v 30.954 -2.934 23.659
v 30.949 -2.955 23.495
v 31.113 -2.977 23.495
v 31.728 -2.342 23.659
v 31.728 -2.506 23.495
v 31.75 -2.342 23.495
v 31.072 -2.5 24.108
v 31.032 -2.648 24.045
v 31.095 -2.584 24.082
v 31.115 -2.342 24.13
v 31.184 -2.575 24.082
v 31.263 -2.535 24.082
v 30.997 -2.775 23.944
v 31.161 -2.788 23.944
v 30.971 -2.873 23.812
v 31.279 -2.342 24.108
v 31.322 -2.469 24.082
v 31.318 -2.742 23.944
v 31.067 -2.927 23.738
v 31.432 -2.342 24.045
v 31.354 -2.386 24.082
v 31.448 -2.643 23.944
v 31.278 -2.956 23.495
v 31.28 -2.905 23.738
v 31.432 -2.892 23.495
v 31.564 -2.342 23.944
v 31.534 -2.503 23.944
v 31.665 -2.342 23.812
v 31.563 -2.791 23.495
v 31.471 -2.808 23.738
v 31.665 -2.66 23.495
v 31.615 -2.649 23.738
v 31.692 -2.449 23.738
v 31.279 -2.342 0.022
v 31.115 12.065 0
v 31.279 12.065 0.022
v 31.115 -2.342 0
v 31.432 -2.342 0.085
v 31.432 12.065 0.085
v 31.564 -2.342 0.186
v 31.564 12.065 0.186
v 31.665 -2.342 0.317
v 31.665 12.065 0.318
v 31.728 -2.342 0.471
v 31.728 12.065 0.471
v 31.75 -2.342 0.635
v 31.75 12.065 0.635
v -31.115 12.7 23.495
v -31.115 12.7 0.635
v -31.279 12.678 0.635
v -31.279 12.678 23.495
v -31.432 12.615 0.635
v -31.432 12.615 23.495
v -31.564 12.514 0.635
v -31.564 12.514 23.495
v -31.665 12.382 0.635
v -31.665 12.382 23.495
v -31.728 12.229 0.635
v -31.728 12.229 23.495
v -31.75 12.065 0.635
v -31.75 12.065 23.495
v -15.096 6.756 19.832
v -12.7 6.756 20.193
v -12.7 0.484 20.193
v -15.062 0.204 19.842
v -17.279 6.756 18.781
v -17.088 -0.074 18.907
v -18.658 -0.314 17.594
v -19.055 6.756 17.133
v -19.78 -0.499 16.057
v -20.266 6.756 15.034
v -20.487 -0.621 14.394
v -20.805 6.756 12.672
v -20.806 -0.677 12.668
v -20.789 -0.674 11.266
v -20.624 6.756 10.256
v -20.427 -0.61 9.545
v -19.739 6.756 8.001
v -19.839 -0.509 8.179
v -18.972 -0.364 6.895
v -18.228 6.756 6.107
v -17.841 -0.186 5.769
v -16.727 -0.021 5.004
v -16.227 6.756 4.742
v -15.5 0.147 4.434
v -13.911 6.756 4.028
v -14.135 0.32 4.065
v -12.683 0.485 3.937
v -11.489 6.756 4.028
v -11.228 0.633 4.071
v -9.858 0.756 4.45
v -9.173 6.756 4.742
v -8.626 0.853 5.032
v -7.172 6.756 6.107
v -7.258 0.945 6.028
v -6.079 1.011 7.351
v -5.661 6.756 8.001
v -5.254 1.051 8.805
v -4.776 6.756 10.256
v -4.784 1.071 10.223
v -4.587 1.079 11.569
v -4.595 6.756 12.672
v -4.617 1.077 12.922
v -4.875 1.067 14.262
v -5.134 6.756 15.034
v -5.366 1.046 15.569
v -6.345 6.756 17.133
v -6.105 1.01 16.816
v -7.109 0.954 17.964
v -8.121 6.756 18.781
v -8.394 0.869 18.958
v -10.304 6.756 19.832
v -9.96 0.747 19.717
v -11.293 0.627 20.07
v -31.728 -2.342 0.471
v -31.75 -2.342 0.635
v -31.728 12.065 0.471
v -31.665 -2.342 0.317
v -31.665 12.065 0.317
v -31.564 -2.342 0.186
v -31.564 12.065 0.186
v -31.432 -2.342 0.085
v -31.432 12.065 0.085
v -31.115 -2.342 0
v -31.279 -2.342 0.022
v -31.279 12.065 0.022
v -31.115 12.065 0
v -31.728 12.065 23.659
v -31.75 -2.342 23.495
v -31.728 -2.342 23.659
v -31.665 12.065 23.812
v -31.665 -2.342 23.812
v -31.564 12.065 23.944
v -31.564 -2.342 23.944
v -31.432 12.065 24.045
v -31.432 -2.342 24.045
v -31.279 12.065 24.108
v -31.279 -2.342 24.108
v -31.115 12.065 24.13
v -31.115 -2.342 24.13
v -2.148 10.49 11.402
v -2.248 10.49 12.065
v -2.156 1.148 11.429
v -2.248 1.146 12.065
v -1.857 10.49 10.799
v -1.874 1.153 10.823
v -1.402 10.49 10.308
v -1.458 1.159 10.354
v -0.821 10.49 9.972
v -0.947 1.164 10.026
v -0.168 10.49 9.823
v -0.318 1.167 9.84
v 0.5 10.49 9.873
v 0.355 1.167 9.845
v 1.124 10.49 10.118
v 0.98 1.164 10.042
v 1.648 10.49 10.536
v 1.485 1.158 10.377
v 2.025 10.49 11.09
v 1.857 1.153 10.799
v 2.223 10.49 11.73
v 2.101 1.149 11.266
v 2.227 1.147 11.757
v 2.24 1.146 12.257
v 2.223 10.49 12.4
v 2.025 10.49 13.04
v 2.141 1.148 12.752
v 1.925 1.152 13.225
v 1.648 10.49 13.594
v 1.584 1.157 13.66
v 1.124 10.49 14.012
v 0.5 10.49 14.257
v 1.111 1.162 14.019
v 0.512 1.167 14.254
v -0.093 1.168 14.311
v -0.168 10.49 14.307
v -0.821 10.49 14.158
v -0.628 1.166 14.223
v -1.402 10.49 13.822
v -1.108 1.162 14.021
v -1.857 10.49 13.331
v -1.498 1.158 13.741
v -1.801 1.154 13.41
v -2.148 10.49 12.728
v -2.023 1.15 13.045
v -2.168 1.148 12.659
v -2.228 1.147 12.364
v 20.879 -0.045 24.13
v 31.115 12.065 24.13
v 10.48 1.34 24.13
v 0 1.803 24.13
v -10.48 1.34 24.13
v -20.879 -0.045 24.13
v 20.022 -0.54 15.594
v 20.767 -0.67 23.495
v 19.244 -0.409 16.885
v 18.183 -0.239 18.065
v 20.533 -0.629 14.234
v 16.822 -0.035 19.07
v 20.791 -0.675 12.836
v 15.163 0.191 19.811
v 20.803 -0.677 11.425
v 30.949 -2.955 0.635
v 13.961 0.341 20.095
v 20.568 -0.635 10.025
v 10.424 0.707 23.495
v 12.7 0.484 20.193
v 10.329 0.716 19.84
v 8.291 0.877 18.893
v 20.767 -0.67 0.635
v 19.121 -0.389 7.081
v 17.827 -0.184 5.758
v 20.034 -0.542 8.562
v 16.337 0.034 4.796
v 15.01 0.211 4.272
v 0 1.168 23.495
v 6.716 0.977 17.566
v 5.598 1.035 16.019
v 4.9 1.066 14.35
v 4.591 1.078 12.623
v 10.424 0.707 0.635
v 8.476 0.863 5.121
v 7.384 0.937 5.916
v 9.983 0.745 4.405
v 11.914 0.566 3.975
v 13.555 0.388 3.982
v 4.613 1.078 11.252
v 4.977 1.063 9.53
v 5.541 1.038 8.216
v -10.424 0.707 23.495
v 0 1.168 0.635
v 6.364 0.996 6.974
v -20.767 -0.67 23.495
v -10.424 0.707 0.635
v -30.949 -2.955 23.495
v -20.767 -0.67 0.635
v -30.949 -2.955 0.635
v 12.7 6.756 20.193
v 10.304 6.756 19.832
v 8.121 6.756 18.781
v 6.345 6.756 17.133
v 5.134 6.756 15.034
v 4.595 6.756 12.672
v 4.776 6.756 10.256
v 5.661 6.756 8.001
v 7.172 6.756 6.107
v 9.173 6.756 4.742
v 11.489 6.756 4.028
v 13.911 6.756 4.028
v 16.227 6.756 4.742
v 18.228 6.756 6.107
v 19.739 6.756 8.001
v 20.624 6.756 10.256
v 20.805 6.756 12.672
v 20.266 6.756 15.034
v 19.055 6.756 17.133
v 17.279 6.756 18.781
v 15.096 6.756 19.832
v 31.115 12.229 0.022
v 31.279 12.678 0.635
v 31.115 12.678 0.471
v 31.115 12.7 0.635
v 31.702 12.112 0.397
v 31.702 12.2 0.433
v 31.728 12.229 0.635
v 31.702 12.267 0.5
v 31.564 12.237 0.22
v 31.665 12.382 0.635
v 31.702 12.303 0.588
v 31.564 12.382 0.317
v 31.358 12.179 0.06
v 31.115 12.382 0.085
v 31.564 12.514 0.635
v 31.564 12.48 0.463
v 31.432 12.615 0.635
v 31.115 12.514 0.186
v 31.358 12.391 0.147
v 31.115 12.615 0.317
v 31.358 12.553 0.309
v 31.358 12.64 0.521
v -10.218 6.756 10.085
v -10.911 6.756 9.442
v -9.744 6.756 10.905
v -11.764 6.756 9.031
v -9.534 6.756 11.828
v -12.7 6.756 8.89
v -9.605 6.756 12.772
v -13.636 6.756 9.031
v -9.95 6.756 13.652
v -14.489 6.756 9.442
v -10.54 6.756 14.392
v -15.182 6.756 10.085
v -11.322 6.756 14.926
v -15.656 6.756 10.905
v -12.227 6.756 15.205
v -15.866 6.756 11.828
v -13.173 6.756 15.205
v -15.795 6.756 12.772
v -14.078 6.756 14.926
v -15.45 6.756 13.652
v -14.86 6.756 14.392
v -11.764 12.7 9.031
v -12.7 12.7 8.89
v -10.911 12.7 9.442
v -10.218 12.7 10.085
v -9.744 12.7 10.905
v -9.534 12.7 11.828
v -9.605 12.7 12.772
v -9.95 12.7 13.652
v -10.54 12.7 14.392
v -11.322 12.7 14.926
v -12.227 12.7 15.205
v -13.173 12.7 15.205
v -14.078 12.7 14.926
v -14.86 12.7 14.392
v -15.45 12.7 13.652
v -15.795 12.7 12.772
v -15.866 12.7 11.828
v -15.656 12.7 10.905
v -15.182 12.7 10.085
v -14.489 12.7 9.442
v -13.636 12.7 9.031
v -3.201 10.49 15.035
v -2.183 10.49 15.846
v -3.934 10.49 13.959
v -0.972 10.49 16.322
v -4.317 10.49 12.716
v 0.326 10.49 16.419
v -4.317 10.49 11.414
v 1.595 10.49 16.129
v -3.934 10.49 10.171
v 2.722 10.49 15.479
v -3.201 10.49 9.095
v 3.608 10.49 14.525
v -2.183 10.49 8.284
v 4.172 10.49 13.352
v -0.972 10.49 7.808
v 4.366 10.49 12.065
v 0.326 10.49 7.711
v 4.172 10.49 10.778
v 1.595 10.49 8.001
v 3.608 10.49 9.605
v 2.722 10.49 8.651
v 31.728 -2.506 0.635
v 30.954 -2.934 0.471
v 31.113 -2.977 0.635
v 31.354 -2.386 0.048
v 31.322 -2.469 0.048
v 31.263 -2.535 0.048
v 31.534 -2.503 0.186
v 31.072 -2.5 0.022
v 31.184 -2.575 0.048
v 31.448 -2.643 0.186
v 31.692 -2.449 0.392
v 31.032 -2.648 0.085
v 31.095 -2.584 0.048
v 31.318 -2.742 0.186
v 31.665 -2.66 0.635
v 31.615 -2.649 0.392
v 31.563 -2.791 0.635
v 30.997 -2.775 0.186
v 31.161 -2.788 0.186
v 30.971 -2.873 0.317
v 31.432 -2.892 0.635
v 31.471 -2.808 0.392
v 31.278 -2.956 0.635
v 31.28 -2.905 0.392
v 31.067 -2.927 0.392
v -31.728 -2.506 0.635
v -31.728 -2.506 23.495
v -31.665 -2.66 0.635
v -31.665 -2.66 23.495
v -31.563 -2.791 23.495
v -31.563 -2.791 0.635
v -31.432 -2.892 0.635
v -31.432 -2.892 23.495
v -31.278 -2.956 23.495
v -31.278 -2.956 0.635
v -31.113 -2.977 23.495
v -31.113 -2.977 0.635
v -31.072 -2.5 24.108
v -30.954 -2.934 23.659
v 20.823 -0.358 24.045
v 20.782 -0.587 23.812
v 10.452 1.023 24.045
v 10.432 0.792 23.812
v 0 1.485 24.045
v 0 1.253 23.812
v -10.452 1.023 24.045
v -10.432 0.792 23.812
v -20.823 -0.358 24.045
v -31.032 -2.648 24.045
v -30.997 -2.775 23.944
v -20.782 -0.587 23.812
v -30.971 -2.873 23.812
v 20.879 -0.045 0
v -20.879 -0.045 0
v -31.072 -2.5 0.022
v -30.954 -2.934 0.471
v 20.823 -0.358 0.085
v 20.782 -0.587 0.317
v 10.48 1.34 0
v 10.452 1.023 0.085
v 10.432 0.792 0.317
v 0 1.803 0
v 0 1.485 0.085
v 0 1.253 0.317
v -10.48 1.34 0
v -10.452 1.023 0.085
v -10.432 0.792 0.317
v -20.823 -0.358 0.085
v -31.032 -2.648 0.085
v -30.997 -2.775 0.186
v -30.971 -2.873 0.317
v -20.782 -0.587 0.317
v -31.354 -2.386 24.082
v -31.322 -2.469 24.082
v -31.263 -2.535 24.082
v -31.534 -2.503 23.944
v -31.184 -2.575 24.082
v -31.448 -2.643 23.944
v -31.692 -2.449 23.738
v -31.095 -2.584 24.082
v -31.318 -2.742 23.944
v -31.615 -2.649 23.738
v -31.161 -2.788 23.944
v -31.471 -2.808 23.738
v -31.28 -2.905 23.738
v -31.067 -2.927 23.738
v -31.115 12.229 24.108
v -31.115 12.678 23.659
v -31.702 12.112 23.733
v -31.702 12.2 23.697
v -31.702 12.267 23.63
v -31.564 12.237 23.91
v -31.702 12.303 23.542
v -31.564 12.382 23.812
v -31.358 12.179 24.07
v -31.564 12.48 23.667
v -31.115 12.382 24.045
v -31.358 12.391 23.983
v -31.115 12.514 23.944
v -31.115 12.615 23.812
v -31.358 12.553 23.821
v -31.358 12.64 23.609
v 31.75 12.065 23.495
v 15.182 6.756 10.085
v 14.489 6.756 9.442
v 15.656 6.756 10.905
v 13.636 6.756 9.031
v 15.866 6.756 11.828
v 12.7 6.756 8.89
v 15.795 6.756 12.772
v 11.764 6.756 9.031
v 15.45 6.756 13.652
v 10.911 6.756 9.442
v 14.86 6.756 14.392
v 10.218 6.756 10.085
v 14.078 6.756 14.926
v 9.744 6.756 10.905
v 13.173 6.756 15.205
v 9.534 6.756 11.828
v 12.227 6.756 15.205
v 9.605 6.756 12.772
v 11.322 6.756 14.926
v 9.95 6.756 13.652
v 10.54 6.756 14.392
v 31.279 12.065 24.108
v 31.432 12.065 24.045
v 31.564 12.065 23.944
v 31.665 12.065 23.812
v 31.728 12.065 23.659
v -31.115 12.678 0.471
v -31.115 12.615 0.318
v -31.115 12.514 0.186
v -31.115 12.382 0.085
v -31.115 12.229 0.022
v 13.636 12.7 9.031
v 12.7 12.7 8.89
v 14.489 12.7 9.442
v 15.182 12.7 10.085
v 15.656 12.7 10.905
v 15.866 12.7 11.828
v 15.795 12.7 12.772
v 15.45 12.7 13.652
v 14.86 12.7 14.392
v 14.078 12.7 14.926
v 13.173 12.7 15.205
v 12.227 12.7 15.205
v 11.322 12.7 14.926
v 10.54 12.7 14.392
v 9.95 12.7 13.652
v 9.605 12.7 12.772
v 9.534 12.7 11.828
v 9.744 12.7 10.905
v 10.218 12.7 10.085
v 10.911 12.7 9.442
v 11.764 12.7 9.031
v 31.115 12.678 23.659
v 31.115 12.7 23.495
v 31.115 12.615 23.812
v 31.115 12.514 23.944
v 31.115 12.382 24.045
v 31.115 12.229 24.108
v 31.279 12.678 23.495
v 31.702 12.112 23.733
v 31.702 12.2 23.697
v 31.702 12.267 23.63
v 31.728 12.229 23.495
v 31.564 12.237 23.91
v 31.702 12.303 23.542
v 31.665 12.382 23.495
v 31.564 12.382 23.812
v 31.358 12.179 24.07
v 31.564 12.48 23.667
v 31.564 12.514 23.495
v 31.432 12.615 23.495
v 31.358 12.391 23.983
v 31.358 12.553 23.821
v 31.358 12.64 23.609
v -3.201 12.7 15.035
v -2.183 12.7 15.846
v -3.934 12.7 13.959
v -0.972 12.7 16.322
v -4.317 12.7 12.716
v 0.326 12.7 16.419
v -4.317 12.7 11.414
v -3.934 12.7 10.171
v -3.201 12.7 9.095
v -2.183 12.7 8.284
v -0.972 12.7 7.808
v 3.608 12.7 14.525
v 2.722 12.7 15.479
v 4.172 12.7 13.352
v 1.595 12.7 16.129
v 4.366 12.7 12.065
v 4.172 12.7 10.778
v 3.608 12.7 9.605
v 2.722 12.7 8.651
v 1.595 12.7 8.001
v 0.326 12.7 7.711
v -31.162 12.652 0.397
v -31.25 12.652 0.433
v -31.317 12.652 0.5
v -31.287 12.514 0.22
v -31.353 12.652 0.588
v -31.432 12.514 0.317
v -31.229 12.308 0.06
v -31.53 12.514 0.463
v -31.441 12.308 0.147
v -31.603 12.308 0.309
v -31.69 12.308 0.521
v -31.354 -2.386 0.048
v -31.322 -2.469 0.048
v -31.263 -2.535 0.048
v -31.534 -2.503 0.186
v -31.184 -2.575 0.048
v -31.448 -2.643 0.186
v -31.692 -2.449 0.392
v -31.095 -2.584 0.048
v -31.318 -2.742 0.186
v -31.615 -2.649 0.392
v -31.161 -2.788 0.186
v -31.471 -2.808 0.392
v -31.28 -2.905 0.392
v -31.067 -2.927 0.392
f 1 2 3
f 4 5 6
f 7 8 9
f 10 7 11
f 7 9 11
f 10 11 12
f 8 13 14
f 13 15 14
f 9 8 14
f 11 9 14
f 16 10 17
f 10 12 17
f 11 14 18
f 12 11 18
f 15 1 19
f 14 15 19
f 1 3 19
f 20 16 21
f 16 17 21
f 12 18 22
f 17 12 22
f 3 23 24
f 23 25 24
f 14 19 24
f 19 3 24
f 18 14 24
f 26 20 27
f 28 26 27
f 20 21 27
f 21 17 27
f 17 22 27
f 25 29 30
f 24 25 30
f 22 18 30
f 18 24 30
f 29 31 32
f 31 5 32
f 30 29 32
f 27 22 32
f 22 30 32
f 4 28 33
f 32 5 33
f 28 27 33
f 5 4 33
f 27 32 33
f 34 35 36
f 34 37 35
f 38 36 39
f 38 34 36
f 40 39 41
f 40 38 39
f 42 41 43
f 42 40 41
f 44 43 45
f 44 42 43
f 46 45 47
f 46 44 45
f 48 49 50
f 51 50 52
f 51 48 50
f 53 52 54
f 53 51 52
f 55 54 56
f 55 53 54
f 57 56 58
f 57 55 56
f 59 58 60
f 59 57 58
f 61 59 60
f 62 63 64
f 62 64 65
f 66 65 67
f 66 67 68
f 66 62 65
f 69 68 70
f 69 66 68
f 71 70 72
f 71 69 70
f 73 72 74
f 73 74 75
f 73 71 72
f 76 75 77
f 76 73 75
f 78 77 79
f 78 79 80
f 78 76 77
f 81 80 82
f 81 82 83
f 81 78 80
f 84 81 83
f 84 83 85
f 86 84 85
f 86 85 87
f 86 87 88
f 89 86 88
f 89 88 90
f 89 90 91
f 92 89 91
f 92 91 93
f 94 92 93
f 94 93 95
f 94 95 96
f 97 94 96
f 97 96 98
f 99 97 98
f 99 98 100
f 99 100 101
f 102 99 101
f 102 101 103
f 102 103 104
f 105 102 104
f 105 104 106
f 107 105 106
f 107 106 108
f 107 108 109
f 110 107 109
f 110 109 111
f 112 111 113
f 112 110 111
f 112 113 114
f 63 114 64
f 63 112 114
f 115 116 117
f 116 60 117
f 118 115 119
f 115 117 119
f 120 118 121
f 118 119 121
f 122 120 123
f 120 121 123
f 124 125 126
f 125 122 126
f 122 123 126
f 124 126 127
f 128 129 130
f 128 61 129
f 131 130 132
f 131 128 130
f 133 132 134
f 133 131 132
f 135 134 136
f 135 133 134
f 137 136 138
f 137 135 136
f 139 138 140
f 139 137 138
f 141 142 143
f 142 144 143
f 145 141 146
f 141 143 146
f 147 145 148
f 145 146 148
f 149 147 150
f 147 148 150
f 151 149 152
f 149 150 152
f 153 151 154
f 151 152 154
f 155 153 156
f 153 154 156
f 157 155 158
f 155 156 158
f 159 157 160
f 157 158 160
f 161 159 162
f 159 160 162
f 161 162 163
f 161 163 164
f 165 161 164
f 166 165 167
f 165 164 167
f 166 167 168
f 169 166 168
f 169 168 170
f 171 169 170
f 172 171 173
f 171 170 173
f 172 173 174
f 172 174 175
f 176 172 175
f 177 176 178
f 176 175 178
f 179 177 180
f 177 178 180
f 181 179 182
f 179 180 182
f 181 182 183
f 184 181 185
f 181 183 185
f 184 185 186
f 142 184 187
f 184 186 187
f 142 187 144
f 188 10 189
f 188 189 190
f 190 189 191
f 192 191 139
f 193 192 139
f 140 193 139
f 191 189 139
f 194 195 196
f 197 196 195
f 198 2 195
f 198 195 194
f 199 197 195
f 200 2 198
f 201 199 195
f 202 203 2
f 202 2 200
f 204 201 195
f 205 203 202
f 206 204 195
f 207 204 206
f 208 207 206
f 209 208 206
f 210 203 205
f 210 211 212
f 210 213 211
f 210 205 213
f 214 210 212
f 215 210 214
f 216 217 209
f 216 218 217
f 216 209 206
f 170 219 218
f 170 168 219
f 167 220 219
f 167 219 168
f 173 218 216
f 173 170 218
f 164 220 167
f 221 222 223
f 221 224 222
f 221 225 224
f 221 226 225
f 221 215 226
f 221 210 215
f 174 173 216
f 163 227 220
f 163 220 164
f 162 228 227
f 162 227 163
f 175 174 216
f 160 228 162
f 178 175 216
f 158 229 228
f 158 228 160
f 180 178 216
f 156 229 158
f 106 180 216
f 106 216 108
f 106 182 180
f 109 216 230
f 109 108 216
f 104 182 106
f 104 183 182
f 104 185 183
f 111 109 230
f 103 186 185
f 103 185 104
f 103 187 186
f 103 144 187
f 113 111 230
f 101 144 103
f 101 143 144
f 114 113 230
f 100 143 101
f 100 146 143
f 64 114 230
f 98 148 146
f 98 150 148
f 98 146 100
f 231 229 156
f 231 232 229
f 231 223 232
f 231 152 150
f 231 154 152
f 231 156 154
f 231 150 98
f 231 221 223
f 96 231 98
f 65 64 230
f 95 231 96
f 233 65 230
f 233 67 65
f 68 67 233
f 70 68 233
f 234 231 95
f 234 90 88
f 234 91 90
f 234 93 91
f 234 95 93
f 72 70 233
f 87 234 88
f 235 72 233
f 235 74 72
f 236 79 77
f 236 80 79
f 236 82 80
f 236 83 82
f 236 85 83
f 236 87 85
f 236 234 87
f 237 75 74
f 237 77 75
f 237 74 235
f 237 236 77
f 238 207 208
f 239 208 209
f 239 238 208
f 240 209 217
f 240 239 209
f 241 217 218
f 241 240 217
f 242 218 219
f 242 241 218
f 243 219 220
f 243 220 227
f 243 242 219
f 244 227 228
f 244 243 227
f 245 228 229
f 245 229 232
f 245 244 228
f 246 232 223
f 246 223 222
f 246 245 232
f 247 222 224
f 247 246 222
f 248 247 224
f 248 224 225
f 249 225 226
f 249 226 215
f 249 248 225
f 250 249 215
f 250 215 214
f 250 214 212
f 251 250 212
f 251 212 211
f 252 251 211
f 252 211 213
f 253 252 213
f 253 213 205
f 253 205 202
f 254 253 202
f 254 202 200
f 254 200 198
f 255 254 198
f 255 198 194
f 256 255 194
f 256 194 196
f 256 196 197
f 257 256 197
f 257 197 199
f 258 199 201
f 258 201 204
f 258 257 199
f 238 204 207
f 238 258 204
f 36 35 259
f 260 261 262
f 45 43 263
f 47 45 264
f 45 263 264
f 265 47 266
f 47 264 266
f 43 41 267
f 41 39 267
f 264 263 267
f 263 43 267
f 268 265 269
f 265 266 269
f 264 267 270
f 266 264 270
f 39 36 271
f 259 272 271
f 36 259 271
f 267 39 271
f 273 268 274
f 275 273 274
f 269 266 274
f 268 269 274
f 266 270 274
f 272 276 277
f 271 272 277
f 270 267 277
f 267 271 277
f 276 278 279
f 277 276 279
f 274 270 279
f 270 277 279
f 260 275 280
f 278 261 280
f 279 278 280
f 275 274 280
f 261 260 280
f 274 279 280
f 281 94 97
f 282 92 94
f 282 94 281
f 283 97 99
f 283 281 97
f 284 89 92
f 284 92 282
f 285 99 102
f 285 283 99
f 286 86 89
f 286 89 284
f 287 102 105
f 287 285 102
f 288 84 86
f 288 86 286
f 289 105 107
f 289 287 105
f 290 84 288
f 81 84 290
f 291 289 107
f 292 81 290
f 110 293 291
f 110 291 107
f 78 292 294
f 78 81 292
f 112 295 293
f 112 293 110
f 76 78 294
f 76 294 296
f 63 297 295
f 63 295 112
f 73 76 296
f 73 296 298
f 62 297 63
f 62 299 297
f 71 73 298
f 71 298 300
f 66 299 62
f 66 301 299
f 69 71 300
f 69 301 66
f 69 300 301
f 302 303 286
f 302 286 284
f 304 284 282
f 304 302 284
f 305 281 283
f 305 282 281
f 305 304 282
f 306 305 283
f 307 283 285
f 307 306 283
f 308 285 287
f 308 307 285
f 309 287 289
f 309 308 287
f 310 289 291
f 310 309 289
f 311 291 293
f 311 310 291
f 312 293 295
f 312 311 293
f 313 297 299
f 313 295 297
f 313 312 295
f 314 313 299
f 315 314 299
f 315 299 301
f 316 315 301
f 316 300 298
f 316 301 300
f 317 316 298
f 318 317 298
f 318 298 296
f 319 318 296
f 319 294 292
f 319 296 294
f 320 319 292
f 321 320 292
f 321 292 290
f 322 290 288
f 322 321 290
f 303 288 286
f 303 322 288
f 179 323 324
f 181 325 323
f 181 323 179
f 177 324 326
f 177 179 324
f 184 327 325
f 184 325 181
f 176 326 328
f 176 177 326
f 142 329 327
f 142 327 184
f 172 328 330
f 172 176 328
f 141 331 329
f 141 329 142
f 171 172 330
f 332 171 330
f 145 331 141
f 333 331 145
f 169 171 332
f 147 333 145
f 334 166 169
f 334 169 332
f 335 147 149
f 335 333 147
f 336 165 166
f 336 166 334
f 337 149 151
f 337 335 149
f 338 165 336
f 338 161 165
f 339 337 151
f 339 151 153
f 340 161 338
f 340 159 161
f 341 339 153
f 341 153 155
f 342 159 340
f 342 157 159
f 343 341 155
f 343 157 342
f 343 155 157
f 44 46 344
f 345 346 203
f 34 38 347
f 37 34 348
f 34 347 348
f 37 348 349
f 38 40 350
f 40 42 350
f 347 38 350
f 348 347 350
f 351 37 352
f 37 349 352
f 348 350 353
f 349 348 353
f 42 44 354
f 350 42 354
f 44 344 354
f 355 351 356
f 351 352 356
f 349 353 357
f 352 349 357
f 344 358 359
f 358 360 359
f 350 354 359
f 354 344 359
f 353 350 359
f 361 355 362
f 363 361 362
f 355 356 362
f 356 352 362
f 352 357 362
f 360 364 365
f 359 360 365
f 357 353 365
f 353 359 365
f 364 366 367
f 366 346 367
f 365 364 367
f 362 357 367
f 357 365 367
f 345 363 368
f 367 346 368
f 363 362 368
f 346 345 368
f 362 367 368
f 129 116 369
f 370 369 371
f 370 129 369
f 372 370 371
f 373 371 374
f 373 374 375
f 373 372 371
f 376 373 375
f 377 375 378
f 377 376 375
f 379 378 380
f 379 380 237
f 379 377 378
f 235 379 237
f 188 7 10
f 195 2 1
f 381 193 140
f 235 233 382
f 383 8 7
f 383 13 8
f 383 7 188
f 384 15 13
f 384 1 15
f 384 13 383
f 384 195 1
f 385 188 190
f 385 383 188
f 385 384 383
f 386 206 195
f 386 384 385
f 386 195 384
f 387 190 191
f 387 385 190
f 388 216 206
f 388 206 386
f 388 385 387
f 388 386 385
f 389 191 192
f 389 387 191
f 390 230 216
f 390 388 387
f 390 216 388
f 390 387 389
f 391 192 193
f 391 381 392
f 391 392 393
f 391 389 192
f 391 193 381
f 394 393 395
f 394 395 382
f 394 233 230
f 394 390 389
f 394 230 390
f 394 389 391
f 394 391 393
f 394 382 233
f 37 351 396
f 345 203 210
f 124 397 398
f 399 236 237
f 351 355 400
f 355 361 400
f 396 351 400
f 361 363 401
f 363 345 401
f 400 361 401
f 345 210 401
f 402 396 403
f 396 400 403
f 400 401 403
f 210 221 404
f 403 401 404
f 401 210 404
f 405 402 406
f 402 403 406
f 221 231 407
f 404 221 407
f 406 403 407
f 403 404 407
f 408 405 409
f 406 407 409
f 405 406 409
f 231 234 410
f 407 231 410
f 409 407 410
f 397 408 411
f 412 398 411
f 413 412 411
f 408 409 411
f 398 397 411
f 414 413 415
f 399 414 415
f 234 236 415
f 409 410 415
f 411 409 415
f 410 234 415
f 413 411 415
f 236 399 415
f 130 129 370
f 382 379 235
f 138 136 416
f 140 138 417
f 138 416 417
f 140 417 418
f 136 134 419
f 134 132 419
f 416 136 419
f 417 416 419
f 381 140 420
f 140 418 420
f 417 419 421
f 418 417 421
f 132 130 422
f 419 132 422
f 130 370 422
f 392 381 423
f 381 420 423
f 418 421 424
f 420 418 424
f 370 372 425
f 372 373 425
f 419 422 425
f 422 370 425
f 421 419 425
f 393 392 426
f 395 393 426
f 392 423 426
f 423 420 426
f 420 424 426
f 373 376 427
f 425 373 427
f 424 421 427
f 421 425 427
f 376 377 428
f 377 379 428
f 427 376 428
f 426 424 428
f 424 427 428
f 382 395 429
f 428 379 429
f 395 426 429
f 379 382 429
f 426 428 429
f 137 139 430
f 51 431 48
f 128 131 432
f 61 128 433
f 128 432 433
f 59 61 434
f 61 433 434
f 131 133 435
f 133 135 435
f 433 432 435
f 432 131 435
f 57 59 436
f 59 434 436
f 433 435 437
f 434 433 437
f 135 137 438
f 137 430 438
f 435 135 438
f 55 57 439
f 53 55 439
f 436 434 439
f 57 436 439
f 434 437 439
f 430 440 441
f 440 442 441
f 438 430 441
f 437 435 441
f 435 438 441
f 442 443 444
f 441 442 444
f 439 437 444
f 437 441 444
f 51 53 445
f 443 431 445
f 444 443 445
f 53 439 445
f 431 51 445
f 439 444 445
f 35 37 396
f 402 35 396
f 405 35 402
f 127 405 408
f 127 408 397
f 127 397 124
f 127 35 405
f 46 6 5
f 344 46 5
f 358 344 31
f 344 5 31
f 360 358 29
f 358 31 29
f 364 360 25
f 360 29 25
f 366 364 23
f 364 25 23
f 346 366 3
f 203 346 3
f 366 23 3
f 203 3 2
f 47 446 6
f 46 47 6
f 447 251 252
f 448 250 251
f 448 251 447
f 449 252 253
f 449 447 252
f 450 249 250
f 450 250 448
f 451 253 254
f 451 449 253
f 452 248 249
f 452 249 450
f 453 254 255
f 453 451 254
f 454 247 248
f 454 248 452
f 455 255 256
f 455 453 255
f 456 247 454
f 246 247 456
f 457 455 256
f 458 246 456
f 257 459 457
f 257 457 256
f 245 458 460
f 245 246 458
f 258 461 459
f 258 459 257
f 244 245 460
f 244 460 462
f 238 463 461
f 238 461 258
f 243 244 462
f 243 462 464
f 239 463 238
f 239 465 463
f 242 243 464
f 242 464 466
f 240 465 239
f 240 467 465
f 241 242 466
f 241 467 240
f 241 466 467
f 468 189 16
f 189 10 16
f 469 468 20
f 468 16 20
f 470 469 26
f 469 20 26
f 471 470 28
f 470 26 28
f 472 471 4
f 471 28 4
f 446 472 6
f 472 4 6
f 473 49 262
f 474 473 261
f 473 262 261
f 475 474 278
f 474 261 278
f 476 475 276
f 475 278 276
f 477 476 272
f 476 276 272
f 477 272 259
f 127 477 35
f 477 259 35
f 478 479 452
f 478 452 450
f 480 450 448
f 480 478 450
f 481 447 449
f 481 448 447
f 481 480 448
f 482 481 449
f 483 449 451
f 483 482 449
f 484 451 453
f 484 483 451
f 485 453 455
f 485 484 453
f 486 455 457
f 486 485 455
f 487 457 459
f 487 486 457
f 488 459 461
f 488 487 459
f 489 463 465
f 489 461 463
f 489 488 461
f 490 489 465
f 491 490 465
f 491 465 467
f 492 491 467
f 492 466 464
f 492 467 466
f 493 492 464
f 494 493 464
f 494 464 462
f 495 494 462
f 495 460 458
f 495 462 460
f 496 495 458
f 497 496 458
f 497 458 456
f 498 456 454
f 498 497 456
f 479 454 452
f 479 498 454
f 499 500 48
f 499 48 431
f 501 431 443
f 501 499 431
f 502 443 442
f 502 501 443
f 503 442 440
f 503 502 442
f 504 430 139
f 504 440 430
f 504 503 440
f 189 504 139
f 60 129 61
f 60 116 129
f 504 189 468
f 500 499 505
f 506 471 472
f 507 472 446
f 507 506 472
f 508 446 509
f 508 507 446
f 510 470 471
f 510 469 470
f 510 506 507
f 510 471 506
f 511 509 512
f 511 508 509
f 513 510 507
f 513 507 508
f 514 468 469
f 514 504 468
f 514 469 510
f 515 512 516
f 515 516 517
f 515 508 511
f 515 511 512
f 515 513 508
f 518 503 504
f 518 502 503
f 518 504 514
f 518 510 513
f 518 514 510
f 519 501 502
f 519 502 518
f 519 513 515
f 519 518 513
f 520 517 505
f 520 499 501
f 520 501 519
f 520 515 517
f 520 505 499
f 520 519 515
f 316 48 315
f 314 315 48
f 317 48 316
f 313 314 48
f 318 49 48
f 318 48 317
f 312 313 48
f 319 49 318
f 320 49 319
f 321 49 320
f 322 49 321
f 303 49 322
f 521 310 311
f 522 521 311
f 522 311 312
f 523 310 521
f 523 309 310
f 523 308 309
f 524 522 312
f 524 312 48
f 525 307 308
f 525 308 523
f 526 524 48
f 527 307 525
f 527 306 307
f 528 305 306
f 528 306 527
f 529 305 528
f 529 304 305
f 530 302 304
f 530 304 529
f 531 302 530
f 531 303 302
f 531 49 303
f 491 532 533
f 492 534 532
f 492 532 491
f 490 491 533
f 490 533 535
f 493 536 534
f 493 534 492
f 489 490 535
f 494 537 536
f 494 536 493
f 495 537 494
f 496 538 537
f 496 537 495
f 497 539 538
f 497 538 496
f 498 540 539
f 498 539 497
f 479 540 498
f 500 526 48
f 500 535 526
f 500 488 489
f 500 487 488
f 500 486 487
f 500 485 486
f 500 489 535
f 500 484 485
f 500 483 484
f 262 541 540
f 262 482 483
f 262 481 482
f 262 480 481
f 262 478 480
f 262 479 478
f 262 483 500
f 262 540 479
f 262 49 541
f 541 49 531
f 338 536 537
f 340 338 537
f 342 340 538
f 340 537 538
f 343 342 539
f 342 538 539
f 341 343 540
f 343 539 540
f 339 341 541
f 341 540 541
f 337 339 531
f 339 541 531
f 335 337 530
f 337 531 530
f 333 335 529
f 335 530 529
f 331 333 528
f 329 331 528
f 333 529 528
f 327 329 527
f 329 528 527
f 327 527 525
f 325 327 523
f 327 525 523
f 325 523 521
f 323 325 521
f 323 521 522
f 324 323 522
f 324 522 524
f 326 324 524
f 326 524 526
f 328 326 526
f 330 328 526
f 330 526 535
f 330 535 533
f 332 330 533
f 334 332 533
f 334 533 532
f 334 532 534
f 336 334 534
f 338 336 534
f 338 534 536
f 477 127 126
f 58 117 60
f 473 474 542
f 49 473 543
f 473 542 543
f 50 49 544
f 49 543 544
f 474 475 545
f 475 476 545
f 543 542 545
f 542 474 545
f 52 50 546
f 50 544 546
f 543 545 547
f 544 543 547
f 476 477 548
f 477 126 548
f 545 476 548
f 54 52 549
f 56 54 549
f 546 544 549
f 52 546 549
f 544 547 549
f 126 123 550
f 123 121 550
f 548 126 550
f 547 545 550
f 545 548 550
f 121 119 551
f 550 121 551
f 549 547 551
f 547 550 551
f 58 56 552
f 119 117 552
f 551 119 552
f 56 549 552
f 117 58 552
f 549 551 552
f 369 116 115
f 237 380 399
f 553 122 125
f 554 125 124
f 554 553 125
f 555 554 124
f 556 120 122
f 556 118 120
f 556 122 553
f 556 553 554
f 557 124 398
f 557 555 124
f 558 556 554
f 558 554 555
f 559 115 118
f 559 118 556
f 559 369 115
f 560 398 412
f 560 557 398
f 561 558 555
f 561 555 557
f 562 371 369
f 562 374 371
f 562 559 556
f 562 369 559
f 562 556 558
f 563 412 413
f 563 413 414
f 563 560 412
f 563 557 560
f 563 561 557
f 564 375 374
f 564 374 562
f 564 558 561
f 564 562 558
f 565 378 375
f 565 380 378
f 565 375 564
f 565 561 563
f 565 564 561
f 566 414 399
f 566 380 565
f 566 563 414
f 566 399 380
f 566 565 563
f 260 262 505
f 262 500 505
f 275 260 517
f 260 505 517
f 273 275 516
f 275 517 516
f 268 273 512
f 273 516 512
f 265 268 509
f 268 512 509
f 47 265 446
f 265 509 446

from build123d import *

# Parameters (mm, degrees)
BOSS_EXTRUDE1_DEPTH                            = 24.13
CBORE_FOR_8_BUTTON_HEAD_CAP_SCREW1_D           = 4.4958
CBORE_FOR_8_BUTTON_HEAD_CAP_SCREW1_CBORE_D     = 8.73252
CBORE_FOR_8_BUTTON_HEAD_CAP_SCREW1_CBORE_DEPTH = 2.2098
CUT_EXTRUDE1_DEPTH                             = 42.512826714
CUT_EXTRUDE1_DEPTH_BACK                        = 42.512826714
SKETCH6_R                                      = 3.175
CUT_EXTRUDE2_DEPTH                             = 42.512826714
CUT_EXTRUDE2_DEPTH_BACK                        = 5.588
SKETCH7_R                                      = 8.128
FILLET1_R                                      = 0.635


with BuildPart() as part:
    # Sketch1 → Boss-Extrude1 (new body)
    with BuildSketch(Plane.XY):
        with BuildLine():
            Line((-31.75, 12.7), (31.75, 12.7))
            Line((31.75, 12.7), (31.75, -3.175))
            ThreePointArc((31.75, -3.175), (0, 1.167638116), (-31.75, -3.175))
            Line((-31.75, -3.175), (-31.75, 12.7))
        make_face()
    extrude(amount=BOSS_EXTRUDE1_DEPTH)

    # CBORE for #8 Button Head Cap Screw1 (through all)
    with Locations(Plane(origin=(0, 12.7, 0), x_dir=(1, 0, 0), z_dir=(0, 1, 0))):
        with Locations((0, -12.065)):
            CounterBoreHole(CBORE_FOR_8_BUTTON_HEAD_CAP_SCREW1_D / 2, CBORE_FOR_8_BUTTON_HEAD_CAP_SCREW1_CBORE_D / 2, CBORE_FOR_8_BUTTON_HEAD_CAP_SCREW1_CBORE_DEPTH)

    # Sketch6 → Cut-Extrude1 (cut, two sides: drawn at the far end of the back side and taken through both)
    with BuildSketch(Plane(origin=(0, 1.167638116, 0), x_dir=(-1, 0, 0), z_dir=(0, -1, 0)).offset(-CUT_EXTRUDE1_DEPTH_BACK)):
        with Locations(Location((12.7, -12.065, 0), (0, 0, 90))):
            Circle(SKETCH6_R)
        with Locations(Location((-12.7, -12.065, 0), (0, 0, 90))):
            Circle(SKETCH6_R)
    extrude(amount=CUT_EXTRUDE1_DEPTH + CUT_EXTRUDE1_DEPTH_BACK, mode=Mode.SUBTRACT)

    # Sketch7 → Cut-Extrude2 (cut, two sides: drawn at the far end of the back side and taken through both)
    with BuildSketch(Plane(origin=(0, 1.167638116, 0), x_dir=(-1, 0, 0), z_dir=(0, -1, 0)).offset(-CUT_EXTRUDE2_DEPTH_BACK)):
        with Locations(Location((12.7, -12.065, 0), (0, 0, 270))):
            Circle(SKETCH7_R)
        with Locations(Location((-12.7, -12.065, 0), (0, 0, 270))):
            Circle(SKETCH7_R)
    extrude(amount=CUT_EXTRUDE2_DEPTH + CUT_EXTRUDE2_DEPTH_BACK, mode=Mode.SUBTRACT)

    # Fillet1
    fillet1_edges = [part.edges().sort_by_distance(p)[0] for p in [
        (0, 12.7, 24.13),
        (-31.75, 4.7625, 24.13),
        (0, 1.167638116, 24.13),
        (-31.75, 4.7625, 0),
        (0, 12.7, 0),
        (31.75, 4.7625, 0),
        (0, 1.167638116, 0),
        (31.75, 4.7625, 24.13),
        (-31.75, -3.175, 12.065),
        (-31.75, 12.7, 12.065),
        (31.75, 12.7, 12.065),
        (31.75, -3.175, 12.065),
    ]]
    fillet(fillet1_edges, radius=FILLET1_R)


solid = part.part
